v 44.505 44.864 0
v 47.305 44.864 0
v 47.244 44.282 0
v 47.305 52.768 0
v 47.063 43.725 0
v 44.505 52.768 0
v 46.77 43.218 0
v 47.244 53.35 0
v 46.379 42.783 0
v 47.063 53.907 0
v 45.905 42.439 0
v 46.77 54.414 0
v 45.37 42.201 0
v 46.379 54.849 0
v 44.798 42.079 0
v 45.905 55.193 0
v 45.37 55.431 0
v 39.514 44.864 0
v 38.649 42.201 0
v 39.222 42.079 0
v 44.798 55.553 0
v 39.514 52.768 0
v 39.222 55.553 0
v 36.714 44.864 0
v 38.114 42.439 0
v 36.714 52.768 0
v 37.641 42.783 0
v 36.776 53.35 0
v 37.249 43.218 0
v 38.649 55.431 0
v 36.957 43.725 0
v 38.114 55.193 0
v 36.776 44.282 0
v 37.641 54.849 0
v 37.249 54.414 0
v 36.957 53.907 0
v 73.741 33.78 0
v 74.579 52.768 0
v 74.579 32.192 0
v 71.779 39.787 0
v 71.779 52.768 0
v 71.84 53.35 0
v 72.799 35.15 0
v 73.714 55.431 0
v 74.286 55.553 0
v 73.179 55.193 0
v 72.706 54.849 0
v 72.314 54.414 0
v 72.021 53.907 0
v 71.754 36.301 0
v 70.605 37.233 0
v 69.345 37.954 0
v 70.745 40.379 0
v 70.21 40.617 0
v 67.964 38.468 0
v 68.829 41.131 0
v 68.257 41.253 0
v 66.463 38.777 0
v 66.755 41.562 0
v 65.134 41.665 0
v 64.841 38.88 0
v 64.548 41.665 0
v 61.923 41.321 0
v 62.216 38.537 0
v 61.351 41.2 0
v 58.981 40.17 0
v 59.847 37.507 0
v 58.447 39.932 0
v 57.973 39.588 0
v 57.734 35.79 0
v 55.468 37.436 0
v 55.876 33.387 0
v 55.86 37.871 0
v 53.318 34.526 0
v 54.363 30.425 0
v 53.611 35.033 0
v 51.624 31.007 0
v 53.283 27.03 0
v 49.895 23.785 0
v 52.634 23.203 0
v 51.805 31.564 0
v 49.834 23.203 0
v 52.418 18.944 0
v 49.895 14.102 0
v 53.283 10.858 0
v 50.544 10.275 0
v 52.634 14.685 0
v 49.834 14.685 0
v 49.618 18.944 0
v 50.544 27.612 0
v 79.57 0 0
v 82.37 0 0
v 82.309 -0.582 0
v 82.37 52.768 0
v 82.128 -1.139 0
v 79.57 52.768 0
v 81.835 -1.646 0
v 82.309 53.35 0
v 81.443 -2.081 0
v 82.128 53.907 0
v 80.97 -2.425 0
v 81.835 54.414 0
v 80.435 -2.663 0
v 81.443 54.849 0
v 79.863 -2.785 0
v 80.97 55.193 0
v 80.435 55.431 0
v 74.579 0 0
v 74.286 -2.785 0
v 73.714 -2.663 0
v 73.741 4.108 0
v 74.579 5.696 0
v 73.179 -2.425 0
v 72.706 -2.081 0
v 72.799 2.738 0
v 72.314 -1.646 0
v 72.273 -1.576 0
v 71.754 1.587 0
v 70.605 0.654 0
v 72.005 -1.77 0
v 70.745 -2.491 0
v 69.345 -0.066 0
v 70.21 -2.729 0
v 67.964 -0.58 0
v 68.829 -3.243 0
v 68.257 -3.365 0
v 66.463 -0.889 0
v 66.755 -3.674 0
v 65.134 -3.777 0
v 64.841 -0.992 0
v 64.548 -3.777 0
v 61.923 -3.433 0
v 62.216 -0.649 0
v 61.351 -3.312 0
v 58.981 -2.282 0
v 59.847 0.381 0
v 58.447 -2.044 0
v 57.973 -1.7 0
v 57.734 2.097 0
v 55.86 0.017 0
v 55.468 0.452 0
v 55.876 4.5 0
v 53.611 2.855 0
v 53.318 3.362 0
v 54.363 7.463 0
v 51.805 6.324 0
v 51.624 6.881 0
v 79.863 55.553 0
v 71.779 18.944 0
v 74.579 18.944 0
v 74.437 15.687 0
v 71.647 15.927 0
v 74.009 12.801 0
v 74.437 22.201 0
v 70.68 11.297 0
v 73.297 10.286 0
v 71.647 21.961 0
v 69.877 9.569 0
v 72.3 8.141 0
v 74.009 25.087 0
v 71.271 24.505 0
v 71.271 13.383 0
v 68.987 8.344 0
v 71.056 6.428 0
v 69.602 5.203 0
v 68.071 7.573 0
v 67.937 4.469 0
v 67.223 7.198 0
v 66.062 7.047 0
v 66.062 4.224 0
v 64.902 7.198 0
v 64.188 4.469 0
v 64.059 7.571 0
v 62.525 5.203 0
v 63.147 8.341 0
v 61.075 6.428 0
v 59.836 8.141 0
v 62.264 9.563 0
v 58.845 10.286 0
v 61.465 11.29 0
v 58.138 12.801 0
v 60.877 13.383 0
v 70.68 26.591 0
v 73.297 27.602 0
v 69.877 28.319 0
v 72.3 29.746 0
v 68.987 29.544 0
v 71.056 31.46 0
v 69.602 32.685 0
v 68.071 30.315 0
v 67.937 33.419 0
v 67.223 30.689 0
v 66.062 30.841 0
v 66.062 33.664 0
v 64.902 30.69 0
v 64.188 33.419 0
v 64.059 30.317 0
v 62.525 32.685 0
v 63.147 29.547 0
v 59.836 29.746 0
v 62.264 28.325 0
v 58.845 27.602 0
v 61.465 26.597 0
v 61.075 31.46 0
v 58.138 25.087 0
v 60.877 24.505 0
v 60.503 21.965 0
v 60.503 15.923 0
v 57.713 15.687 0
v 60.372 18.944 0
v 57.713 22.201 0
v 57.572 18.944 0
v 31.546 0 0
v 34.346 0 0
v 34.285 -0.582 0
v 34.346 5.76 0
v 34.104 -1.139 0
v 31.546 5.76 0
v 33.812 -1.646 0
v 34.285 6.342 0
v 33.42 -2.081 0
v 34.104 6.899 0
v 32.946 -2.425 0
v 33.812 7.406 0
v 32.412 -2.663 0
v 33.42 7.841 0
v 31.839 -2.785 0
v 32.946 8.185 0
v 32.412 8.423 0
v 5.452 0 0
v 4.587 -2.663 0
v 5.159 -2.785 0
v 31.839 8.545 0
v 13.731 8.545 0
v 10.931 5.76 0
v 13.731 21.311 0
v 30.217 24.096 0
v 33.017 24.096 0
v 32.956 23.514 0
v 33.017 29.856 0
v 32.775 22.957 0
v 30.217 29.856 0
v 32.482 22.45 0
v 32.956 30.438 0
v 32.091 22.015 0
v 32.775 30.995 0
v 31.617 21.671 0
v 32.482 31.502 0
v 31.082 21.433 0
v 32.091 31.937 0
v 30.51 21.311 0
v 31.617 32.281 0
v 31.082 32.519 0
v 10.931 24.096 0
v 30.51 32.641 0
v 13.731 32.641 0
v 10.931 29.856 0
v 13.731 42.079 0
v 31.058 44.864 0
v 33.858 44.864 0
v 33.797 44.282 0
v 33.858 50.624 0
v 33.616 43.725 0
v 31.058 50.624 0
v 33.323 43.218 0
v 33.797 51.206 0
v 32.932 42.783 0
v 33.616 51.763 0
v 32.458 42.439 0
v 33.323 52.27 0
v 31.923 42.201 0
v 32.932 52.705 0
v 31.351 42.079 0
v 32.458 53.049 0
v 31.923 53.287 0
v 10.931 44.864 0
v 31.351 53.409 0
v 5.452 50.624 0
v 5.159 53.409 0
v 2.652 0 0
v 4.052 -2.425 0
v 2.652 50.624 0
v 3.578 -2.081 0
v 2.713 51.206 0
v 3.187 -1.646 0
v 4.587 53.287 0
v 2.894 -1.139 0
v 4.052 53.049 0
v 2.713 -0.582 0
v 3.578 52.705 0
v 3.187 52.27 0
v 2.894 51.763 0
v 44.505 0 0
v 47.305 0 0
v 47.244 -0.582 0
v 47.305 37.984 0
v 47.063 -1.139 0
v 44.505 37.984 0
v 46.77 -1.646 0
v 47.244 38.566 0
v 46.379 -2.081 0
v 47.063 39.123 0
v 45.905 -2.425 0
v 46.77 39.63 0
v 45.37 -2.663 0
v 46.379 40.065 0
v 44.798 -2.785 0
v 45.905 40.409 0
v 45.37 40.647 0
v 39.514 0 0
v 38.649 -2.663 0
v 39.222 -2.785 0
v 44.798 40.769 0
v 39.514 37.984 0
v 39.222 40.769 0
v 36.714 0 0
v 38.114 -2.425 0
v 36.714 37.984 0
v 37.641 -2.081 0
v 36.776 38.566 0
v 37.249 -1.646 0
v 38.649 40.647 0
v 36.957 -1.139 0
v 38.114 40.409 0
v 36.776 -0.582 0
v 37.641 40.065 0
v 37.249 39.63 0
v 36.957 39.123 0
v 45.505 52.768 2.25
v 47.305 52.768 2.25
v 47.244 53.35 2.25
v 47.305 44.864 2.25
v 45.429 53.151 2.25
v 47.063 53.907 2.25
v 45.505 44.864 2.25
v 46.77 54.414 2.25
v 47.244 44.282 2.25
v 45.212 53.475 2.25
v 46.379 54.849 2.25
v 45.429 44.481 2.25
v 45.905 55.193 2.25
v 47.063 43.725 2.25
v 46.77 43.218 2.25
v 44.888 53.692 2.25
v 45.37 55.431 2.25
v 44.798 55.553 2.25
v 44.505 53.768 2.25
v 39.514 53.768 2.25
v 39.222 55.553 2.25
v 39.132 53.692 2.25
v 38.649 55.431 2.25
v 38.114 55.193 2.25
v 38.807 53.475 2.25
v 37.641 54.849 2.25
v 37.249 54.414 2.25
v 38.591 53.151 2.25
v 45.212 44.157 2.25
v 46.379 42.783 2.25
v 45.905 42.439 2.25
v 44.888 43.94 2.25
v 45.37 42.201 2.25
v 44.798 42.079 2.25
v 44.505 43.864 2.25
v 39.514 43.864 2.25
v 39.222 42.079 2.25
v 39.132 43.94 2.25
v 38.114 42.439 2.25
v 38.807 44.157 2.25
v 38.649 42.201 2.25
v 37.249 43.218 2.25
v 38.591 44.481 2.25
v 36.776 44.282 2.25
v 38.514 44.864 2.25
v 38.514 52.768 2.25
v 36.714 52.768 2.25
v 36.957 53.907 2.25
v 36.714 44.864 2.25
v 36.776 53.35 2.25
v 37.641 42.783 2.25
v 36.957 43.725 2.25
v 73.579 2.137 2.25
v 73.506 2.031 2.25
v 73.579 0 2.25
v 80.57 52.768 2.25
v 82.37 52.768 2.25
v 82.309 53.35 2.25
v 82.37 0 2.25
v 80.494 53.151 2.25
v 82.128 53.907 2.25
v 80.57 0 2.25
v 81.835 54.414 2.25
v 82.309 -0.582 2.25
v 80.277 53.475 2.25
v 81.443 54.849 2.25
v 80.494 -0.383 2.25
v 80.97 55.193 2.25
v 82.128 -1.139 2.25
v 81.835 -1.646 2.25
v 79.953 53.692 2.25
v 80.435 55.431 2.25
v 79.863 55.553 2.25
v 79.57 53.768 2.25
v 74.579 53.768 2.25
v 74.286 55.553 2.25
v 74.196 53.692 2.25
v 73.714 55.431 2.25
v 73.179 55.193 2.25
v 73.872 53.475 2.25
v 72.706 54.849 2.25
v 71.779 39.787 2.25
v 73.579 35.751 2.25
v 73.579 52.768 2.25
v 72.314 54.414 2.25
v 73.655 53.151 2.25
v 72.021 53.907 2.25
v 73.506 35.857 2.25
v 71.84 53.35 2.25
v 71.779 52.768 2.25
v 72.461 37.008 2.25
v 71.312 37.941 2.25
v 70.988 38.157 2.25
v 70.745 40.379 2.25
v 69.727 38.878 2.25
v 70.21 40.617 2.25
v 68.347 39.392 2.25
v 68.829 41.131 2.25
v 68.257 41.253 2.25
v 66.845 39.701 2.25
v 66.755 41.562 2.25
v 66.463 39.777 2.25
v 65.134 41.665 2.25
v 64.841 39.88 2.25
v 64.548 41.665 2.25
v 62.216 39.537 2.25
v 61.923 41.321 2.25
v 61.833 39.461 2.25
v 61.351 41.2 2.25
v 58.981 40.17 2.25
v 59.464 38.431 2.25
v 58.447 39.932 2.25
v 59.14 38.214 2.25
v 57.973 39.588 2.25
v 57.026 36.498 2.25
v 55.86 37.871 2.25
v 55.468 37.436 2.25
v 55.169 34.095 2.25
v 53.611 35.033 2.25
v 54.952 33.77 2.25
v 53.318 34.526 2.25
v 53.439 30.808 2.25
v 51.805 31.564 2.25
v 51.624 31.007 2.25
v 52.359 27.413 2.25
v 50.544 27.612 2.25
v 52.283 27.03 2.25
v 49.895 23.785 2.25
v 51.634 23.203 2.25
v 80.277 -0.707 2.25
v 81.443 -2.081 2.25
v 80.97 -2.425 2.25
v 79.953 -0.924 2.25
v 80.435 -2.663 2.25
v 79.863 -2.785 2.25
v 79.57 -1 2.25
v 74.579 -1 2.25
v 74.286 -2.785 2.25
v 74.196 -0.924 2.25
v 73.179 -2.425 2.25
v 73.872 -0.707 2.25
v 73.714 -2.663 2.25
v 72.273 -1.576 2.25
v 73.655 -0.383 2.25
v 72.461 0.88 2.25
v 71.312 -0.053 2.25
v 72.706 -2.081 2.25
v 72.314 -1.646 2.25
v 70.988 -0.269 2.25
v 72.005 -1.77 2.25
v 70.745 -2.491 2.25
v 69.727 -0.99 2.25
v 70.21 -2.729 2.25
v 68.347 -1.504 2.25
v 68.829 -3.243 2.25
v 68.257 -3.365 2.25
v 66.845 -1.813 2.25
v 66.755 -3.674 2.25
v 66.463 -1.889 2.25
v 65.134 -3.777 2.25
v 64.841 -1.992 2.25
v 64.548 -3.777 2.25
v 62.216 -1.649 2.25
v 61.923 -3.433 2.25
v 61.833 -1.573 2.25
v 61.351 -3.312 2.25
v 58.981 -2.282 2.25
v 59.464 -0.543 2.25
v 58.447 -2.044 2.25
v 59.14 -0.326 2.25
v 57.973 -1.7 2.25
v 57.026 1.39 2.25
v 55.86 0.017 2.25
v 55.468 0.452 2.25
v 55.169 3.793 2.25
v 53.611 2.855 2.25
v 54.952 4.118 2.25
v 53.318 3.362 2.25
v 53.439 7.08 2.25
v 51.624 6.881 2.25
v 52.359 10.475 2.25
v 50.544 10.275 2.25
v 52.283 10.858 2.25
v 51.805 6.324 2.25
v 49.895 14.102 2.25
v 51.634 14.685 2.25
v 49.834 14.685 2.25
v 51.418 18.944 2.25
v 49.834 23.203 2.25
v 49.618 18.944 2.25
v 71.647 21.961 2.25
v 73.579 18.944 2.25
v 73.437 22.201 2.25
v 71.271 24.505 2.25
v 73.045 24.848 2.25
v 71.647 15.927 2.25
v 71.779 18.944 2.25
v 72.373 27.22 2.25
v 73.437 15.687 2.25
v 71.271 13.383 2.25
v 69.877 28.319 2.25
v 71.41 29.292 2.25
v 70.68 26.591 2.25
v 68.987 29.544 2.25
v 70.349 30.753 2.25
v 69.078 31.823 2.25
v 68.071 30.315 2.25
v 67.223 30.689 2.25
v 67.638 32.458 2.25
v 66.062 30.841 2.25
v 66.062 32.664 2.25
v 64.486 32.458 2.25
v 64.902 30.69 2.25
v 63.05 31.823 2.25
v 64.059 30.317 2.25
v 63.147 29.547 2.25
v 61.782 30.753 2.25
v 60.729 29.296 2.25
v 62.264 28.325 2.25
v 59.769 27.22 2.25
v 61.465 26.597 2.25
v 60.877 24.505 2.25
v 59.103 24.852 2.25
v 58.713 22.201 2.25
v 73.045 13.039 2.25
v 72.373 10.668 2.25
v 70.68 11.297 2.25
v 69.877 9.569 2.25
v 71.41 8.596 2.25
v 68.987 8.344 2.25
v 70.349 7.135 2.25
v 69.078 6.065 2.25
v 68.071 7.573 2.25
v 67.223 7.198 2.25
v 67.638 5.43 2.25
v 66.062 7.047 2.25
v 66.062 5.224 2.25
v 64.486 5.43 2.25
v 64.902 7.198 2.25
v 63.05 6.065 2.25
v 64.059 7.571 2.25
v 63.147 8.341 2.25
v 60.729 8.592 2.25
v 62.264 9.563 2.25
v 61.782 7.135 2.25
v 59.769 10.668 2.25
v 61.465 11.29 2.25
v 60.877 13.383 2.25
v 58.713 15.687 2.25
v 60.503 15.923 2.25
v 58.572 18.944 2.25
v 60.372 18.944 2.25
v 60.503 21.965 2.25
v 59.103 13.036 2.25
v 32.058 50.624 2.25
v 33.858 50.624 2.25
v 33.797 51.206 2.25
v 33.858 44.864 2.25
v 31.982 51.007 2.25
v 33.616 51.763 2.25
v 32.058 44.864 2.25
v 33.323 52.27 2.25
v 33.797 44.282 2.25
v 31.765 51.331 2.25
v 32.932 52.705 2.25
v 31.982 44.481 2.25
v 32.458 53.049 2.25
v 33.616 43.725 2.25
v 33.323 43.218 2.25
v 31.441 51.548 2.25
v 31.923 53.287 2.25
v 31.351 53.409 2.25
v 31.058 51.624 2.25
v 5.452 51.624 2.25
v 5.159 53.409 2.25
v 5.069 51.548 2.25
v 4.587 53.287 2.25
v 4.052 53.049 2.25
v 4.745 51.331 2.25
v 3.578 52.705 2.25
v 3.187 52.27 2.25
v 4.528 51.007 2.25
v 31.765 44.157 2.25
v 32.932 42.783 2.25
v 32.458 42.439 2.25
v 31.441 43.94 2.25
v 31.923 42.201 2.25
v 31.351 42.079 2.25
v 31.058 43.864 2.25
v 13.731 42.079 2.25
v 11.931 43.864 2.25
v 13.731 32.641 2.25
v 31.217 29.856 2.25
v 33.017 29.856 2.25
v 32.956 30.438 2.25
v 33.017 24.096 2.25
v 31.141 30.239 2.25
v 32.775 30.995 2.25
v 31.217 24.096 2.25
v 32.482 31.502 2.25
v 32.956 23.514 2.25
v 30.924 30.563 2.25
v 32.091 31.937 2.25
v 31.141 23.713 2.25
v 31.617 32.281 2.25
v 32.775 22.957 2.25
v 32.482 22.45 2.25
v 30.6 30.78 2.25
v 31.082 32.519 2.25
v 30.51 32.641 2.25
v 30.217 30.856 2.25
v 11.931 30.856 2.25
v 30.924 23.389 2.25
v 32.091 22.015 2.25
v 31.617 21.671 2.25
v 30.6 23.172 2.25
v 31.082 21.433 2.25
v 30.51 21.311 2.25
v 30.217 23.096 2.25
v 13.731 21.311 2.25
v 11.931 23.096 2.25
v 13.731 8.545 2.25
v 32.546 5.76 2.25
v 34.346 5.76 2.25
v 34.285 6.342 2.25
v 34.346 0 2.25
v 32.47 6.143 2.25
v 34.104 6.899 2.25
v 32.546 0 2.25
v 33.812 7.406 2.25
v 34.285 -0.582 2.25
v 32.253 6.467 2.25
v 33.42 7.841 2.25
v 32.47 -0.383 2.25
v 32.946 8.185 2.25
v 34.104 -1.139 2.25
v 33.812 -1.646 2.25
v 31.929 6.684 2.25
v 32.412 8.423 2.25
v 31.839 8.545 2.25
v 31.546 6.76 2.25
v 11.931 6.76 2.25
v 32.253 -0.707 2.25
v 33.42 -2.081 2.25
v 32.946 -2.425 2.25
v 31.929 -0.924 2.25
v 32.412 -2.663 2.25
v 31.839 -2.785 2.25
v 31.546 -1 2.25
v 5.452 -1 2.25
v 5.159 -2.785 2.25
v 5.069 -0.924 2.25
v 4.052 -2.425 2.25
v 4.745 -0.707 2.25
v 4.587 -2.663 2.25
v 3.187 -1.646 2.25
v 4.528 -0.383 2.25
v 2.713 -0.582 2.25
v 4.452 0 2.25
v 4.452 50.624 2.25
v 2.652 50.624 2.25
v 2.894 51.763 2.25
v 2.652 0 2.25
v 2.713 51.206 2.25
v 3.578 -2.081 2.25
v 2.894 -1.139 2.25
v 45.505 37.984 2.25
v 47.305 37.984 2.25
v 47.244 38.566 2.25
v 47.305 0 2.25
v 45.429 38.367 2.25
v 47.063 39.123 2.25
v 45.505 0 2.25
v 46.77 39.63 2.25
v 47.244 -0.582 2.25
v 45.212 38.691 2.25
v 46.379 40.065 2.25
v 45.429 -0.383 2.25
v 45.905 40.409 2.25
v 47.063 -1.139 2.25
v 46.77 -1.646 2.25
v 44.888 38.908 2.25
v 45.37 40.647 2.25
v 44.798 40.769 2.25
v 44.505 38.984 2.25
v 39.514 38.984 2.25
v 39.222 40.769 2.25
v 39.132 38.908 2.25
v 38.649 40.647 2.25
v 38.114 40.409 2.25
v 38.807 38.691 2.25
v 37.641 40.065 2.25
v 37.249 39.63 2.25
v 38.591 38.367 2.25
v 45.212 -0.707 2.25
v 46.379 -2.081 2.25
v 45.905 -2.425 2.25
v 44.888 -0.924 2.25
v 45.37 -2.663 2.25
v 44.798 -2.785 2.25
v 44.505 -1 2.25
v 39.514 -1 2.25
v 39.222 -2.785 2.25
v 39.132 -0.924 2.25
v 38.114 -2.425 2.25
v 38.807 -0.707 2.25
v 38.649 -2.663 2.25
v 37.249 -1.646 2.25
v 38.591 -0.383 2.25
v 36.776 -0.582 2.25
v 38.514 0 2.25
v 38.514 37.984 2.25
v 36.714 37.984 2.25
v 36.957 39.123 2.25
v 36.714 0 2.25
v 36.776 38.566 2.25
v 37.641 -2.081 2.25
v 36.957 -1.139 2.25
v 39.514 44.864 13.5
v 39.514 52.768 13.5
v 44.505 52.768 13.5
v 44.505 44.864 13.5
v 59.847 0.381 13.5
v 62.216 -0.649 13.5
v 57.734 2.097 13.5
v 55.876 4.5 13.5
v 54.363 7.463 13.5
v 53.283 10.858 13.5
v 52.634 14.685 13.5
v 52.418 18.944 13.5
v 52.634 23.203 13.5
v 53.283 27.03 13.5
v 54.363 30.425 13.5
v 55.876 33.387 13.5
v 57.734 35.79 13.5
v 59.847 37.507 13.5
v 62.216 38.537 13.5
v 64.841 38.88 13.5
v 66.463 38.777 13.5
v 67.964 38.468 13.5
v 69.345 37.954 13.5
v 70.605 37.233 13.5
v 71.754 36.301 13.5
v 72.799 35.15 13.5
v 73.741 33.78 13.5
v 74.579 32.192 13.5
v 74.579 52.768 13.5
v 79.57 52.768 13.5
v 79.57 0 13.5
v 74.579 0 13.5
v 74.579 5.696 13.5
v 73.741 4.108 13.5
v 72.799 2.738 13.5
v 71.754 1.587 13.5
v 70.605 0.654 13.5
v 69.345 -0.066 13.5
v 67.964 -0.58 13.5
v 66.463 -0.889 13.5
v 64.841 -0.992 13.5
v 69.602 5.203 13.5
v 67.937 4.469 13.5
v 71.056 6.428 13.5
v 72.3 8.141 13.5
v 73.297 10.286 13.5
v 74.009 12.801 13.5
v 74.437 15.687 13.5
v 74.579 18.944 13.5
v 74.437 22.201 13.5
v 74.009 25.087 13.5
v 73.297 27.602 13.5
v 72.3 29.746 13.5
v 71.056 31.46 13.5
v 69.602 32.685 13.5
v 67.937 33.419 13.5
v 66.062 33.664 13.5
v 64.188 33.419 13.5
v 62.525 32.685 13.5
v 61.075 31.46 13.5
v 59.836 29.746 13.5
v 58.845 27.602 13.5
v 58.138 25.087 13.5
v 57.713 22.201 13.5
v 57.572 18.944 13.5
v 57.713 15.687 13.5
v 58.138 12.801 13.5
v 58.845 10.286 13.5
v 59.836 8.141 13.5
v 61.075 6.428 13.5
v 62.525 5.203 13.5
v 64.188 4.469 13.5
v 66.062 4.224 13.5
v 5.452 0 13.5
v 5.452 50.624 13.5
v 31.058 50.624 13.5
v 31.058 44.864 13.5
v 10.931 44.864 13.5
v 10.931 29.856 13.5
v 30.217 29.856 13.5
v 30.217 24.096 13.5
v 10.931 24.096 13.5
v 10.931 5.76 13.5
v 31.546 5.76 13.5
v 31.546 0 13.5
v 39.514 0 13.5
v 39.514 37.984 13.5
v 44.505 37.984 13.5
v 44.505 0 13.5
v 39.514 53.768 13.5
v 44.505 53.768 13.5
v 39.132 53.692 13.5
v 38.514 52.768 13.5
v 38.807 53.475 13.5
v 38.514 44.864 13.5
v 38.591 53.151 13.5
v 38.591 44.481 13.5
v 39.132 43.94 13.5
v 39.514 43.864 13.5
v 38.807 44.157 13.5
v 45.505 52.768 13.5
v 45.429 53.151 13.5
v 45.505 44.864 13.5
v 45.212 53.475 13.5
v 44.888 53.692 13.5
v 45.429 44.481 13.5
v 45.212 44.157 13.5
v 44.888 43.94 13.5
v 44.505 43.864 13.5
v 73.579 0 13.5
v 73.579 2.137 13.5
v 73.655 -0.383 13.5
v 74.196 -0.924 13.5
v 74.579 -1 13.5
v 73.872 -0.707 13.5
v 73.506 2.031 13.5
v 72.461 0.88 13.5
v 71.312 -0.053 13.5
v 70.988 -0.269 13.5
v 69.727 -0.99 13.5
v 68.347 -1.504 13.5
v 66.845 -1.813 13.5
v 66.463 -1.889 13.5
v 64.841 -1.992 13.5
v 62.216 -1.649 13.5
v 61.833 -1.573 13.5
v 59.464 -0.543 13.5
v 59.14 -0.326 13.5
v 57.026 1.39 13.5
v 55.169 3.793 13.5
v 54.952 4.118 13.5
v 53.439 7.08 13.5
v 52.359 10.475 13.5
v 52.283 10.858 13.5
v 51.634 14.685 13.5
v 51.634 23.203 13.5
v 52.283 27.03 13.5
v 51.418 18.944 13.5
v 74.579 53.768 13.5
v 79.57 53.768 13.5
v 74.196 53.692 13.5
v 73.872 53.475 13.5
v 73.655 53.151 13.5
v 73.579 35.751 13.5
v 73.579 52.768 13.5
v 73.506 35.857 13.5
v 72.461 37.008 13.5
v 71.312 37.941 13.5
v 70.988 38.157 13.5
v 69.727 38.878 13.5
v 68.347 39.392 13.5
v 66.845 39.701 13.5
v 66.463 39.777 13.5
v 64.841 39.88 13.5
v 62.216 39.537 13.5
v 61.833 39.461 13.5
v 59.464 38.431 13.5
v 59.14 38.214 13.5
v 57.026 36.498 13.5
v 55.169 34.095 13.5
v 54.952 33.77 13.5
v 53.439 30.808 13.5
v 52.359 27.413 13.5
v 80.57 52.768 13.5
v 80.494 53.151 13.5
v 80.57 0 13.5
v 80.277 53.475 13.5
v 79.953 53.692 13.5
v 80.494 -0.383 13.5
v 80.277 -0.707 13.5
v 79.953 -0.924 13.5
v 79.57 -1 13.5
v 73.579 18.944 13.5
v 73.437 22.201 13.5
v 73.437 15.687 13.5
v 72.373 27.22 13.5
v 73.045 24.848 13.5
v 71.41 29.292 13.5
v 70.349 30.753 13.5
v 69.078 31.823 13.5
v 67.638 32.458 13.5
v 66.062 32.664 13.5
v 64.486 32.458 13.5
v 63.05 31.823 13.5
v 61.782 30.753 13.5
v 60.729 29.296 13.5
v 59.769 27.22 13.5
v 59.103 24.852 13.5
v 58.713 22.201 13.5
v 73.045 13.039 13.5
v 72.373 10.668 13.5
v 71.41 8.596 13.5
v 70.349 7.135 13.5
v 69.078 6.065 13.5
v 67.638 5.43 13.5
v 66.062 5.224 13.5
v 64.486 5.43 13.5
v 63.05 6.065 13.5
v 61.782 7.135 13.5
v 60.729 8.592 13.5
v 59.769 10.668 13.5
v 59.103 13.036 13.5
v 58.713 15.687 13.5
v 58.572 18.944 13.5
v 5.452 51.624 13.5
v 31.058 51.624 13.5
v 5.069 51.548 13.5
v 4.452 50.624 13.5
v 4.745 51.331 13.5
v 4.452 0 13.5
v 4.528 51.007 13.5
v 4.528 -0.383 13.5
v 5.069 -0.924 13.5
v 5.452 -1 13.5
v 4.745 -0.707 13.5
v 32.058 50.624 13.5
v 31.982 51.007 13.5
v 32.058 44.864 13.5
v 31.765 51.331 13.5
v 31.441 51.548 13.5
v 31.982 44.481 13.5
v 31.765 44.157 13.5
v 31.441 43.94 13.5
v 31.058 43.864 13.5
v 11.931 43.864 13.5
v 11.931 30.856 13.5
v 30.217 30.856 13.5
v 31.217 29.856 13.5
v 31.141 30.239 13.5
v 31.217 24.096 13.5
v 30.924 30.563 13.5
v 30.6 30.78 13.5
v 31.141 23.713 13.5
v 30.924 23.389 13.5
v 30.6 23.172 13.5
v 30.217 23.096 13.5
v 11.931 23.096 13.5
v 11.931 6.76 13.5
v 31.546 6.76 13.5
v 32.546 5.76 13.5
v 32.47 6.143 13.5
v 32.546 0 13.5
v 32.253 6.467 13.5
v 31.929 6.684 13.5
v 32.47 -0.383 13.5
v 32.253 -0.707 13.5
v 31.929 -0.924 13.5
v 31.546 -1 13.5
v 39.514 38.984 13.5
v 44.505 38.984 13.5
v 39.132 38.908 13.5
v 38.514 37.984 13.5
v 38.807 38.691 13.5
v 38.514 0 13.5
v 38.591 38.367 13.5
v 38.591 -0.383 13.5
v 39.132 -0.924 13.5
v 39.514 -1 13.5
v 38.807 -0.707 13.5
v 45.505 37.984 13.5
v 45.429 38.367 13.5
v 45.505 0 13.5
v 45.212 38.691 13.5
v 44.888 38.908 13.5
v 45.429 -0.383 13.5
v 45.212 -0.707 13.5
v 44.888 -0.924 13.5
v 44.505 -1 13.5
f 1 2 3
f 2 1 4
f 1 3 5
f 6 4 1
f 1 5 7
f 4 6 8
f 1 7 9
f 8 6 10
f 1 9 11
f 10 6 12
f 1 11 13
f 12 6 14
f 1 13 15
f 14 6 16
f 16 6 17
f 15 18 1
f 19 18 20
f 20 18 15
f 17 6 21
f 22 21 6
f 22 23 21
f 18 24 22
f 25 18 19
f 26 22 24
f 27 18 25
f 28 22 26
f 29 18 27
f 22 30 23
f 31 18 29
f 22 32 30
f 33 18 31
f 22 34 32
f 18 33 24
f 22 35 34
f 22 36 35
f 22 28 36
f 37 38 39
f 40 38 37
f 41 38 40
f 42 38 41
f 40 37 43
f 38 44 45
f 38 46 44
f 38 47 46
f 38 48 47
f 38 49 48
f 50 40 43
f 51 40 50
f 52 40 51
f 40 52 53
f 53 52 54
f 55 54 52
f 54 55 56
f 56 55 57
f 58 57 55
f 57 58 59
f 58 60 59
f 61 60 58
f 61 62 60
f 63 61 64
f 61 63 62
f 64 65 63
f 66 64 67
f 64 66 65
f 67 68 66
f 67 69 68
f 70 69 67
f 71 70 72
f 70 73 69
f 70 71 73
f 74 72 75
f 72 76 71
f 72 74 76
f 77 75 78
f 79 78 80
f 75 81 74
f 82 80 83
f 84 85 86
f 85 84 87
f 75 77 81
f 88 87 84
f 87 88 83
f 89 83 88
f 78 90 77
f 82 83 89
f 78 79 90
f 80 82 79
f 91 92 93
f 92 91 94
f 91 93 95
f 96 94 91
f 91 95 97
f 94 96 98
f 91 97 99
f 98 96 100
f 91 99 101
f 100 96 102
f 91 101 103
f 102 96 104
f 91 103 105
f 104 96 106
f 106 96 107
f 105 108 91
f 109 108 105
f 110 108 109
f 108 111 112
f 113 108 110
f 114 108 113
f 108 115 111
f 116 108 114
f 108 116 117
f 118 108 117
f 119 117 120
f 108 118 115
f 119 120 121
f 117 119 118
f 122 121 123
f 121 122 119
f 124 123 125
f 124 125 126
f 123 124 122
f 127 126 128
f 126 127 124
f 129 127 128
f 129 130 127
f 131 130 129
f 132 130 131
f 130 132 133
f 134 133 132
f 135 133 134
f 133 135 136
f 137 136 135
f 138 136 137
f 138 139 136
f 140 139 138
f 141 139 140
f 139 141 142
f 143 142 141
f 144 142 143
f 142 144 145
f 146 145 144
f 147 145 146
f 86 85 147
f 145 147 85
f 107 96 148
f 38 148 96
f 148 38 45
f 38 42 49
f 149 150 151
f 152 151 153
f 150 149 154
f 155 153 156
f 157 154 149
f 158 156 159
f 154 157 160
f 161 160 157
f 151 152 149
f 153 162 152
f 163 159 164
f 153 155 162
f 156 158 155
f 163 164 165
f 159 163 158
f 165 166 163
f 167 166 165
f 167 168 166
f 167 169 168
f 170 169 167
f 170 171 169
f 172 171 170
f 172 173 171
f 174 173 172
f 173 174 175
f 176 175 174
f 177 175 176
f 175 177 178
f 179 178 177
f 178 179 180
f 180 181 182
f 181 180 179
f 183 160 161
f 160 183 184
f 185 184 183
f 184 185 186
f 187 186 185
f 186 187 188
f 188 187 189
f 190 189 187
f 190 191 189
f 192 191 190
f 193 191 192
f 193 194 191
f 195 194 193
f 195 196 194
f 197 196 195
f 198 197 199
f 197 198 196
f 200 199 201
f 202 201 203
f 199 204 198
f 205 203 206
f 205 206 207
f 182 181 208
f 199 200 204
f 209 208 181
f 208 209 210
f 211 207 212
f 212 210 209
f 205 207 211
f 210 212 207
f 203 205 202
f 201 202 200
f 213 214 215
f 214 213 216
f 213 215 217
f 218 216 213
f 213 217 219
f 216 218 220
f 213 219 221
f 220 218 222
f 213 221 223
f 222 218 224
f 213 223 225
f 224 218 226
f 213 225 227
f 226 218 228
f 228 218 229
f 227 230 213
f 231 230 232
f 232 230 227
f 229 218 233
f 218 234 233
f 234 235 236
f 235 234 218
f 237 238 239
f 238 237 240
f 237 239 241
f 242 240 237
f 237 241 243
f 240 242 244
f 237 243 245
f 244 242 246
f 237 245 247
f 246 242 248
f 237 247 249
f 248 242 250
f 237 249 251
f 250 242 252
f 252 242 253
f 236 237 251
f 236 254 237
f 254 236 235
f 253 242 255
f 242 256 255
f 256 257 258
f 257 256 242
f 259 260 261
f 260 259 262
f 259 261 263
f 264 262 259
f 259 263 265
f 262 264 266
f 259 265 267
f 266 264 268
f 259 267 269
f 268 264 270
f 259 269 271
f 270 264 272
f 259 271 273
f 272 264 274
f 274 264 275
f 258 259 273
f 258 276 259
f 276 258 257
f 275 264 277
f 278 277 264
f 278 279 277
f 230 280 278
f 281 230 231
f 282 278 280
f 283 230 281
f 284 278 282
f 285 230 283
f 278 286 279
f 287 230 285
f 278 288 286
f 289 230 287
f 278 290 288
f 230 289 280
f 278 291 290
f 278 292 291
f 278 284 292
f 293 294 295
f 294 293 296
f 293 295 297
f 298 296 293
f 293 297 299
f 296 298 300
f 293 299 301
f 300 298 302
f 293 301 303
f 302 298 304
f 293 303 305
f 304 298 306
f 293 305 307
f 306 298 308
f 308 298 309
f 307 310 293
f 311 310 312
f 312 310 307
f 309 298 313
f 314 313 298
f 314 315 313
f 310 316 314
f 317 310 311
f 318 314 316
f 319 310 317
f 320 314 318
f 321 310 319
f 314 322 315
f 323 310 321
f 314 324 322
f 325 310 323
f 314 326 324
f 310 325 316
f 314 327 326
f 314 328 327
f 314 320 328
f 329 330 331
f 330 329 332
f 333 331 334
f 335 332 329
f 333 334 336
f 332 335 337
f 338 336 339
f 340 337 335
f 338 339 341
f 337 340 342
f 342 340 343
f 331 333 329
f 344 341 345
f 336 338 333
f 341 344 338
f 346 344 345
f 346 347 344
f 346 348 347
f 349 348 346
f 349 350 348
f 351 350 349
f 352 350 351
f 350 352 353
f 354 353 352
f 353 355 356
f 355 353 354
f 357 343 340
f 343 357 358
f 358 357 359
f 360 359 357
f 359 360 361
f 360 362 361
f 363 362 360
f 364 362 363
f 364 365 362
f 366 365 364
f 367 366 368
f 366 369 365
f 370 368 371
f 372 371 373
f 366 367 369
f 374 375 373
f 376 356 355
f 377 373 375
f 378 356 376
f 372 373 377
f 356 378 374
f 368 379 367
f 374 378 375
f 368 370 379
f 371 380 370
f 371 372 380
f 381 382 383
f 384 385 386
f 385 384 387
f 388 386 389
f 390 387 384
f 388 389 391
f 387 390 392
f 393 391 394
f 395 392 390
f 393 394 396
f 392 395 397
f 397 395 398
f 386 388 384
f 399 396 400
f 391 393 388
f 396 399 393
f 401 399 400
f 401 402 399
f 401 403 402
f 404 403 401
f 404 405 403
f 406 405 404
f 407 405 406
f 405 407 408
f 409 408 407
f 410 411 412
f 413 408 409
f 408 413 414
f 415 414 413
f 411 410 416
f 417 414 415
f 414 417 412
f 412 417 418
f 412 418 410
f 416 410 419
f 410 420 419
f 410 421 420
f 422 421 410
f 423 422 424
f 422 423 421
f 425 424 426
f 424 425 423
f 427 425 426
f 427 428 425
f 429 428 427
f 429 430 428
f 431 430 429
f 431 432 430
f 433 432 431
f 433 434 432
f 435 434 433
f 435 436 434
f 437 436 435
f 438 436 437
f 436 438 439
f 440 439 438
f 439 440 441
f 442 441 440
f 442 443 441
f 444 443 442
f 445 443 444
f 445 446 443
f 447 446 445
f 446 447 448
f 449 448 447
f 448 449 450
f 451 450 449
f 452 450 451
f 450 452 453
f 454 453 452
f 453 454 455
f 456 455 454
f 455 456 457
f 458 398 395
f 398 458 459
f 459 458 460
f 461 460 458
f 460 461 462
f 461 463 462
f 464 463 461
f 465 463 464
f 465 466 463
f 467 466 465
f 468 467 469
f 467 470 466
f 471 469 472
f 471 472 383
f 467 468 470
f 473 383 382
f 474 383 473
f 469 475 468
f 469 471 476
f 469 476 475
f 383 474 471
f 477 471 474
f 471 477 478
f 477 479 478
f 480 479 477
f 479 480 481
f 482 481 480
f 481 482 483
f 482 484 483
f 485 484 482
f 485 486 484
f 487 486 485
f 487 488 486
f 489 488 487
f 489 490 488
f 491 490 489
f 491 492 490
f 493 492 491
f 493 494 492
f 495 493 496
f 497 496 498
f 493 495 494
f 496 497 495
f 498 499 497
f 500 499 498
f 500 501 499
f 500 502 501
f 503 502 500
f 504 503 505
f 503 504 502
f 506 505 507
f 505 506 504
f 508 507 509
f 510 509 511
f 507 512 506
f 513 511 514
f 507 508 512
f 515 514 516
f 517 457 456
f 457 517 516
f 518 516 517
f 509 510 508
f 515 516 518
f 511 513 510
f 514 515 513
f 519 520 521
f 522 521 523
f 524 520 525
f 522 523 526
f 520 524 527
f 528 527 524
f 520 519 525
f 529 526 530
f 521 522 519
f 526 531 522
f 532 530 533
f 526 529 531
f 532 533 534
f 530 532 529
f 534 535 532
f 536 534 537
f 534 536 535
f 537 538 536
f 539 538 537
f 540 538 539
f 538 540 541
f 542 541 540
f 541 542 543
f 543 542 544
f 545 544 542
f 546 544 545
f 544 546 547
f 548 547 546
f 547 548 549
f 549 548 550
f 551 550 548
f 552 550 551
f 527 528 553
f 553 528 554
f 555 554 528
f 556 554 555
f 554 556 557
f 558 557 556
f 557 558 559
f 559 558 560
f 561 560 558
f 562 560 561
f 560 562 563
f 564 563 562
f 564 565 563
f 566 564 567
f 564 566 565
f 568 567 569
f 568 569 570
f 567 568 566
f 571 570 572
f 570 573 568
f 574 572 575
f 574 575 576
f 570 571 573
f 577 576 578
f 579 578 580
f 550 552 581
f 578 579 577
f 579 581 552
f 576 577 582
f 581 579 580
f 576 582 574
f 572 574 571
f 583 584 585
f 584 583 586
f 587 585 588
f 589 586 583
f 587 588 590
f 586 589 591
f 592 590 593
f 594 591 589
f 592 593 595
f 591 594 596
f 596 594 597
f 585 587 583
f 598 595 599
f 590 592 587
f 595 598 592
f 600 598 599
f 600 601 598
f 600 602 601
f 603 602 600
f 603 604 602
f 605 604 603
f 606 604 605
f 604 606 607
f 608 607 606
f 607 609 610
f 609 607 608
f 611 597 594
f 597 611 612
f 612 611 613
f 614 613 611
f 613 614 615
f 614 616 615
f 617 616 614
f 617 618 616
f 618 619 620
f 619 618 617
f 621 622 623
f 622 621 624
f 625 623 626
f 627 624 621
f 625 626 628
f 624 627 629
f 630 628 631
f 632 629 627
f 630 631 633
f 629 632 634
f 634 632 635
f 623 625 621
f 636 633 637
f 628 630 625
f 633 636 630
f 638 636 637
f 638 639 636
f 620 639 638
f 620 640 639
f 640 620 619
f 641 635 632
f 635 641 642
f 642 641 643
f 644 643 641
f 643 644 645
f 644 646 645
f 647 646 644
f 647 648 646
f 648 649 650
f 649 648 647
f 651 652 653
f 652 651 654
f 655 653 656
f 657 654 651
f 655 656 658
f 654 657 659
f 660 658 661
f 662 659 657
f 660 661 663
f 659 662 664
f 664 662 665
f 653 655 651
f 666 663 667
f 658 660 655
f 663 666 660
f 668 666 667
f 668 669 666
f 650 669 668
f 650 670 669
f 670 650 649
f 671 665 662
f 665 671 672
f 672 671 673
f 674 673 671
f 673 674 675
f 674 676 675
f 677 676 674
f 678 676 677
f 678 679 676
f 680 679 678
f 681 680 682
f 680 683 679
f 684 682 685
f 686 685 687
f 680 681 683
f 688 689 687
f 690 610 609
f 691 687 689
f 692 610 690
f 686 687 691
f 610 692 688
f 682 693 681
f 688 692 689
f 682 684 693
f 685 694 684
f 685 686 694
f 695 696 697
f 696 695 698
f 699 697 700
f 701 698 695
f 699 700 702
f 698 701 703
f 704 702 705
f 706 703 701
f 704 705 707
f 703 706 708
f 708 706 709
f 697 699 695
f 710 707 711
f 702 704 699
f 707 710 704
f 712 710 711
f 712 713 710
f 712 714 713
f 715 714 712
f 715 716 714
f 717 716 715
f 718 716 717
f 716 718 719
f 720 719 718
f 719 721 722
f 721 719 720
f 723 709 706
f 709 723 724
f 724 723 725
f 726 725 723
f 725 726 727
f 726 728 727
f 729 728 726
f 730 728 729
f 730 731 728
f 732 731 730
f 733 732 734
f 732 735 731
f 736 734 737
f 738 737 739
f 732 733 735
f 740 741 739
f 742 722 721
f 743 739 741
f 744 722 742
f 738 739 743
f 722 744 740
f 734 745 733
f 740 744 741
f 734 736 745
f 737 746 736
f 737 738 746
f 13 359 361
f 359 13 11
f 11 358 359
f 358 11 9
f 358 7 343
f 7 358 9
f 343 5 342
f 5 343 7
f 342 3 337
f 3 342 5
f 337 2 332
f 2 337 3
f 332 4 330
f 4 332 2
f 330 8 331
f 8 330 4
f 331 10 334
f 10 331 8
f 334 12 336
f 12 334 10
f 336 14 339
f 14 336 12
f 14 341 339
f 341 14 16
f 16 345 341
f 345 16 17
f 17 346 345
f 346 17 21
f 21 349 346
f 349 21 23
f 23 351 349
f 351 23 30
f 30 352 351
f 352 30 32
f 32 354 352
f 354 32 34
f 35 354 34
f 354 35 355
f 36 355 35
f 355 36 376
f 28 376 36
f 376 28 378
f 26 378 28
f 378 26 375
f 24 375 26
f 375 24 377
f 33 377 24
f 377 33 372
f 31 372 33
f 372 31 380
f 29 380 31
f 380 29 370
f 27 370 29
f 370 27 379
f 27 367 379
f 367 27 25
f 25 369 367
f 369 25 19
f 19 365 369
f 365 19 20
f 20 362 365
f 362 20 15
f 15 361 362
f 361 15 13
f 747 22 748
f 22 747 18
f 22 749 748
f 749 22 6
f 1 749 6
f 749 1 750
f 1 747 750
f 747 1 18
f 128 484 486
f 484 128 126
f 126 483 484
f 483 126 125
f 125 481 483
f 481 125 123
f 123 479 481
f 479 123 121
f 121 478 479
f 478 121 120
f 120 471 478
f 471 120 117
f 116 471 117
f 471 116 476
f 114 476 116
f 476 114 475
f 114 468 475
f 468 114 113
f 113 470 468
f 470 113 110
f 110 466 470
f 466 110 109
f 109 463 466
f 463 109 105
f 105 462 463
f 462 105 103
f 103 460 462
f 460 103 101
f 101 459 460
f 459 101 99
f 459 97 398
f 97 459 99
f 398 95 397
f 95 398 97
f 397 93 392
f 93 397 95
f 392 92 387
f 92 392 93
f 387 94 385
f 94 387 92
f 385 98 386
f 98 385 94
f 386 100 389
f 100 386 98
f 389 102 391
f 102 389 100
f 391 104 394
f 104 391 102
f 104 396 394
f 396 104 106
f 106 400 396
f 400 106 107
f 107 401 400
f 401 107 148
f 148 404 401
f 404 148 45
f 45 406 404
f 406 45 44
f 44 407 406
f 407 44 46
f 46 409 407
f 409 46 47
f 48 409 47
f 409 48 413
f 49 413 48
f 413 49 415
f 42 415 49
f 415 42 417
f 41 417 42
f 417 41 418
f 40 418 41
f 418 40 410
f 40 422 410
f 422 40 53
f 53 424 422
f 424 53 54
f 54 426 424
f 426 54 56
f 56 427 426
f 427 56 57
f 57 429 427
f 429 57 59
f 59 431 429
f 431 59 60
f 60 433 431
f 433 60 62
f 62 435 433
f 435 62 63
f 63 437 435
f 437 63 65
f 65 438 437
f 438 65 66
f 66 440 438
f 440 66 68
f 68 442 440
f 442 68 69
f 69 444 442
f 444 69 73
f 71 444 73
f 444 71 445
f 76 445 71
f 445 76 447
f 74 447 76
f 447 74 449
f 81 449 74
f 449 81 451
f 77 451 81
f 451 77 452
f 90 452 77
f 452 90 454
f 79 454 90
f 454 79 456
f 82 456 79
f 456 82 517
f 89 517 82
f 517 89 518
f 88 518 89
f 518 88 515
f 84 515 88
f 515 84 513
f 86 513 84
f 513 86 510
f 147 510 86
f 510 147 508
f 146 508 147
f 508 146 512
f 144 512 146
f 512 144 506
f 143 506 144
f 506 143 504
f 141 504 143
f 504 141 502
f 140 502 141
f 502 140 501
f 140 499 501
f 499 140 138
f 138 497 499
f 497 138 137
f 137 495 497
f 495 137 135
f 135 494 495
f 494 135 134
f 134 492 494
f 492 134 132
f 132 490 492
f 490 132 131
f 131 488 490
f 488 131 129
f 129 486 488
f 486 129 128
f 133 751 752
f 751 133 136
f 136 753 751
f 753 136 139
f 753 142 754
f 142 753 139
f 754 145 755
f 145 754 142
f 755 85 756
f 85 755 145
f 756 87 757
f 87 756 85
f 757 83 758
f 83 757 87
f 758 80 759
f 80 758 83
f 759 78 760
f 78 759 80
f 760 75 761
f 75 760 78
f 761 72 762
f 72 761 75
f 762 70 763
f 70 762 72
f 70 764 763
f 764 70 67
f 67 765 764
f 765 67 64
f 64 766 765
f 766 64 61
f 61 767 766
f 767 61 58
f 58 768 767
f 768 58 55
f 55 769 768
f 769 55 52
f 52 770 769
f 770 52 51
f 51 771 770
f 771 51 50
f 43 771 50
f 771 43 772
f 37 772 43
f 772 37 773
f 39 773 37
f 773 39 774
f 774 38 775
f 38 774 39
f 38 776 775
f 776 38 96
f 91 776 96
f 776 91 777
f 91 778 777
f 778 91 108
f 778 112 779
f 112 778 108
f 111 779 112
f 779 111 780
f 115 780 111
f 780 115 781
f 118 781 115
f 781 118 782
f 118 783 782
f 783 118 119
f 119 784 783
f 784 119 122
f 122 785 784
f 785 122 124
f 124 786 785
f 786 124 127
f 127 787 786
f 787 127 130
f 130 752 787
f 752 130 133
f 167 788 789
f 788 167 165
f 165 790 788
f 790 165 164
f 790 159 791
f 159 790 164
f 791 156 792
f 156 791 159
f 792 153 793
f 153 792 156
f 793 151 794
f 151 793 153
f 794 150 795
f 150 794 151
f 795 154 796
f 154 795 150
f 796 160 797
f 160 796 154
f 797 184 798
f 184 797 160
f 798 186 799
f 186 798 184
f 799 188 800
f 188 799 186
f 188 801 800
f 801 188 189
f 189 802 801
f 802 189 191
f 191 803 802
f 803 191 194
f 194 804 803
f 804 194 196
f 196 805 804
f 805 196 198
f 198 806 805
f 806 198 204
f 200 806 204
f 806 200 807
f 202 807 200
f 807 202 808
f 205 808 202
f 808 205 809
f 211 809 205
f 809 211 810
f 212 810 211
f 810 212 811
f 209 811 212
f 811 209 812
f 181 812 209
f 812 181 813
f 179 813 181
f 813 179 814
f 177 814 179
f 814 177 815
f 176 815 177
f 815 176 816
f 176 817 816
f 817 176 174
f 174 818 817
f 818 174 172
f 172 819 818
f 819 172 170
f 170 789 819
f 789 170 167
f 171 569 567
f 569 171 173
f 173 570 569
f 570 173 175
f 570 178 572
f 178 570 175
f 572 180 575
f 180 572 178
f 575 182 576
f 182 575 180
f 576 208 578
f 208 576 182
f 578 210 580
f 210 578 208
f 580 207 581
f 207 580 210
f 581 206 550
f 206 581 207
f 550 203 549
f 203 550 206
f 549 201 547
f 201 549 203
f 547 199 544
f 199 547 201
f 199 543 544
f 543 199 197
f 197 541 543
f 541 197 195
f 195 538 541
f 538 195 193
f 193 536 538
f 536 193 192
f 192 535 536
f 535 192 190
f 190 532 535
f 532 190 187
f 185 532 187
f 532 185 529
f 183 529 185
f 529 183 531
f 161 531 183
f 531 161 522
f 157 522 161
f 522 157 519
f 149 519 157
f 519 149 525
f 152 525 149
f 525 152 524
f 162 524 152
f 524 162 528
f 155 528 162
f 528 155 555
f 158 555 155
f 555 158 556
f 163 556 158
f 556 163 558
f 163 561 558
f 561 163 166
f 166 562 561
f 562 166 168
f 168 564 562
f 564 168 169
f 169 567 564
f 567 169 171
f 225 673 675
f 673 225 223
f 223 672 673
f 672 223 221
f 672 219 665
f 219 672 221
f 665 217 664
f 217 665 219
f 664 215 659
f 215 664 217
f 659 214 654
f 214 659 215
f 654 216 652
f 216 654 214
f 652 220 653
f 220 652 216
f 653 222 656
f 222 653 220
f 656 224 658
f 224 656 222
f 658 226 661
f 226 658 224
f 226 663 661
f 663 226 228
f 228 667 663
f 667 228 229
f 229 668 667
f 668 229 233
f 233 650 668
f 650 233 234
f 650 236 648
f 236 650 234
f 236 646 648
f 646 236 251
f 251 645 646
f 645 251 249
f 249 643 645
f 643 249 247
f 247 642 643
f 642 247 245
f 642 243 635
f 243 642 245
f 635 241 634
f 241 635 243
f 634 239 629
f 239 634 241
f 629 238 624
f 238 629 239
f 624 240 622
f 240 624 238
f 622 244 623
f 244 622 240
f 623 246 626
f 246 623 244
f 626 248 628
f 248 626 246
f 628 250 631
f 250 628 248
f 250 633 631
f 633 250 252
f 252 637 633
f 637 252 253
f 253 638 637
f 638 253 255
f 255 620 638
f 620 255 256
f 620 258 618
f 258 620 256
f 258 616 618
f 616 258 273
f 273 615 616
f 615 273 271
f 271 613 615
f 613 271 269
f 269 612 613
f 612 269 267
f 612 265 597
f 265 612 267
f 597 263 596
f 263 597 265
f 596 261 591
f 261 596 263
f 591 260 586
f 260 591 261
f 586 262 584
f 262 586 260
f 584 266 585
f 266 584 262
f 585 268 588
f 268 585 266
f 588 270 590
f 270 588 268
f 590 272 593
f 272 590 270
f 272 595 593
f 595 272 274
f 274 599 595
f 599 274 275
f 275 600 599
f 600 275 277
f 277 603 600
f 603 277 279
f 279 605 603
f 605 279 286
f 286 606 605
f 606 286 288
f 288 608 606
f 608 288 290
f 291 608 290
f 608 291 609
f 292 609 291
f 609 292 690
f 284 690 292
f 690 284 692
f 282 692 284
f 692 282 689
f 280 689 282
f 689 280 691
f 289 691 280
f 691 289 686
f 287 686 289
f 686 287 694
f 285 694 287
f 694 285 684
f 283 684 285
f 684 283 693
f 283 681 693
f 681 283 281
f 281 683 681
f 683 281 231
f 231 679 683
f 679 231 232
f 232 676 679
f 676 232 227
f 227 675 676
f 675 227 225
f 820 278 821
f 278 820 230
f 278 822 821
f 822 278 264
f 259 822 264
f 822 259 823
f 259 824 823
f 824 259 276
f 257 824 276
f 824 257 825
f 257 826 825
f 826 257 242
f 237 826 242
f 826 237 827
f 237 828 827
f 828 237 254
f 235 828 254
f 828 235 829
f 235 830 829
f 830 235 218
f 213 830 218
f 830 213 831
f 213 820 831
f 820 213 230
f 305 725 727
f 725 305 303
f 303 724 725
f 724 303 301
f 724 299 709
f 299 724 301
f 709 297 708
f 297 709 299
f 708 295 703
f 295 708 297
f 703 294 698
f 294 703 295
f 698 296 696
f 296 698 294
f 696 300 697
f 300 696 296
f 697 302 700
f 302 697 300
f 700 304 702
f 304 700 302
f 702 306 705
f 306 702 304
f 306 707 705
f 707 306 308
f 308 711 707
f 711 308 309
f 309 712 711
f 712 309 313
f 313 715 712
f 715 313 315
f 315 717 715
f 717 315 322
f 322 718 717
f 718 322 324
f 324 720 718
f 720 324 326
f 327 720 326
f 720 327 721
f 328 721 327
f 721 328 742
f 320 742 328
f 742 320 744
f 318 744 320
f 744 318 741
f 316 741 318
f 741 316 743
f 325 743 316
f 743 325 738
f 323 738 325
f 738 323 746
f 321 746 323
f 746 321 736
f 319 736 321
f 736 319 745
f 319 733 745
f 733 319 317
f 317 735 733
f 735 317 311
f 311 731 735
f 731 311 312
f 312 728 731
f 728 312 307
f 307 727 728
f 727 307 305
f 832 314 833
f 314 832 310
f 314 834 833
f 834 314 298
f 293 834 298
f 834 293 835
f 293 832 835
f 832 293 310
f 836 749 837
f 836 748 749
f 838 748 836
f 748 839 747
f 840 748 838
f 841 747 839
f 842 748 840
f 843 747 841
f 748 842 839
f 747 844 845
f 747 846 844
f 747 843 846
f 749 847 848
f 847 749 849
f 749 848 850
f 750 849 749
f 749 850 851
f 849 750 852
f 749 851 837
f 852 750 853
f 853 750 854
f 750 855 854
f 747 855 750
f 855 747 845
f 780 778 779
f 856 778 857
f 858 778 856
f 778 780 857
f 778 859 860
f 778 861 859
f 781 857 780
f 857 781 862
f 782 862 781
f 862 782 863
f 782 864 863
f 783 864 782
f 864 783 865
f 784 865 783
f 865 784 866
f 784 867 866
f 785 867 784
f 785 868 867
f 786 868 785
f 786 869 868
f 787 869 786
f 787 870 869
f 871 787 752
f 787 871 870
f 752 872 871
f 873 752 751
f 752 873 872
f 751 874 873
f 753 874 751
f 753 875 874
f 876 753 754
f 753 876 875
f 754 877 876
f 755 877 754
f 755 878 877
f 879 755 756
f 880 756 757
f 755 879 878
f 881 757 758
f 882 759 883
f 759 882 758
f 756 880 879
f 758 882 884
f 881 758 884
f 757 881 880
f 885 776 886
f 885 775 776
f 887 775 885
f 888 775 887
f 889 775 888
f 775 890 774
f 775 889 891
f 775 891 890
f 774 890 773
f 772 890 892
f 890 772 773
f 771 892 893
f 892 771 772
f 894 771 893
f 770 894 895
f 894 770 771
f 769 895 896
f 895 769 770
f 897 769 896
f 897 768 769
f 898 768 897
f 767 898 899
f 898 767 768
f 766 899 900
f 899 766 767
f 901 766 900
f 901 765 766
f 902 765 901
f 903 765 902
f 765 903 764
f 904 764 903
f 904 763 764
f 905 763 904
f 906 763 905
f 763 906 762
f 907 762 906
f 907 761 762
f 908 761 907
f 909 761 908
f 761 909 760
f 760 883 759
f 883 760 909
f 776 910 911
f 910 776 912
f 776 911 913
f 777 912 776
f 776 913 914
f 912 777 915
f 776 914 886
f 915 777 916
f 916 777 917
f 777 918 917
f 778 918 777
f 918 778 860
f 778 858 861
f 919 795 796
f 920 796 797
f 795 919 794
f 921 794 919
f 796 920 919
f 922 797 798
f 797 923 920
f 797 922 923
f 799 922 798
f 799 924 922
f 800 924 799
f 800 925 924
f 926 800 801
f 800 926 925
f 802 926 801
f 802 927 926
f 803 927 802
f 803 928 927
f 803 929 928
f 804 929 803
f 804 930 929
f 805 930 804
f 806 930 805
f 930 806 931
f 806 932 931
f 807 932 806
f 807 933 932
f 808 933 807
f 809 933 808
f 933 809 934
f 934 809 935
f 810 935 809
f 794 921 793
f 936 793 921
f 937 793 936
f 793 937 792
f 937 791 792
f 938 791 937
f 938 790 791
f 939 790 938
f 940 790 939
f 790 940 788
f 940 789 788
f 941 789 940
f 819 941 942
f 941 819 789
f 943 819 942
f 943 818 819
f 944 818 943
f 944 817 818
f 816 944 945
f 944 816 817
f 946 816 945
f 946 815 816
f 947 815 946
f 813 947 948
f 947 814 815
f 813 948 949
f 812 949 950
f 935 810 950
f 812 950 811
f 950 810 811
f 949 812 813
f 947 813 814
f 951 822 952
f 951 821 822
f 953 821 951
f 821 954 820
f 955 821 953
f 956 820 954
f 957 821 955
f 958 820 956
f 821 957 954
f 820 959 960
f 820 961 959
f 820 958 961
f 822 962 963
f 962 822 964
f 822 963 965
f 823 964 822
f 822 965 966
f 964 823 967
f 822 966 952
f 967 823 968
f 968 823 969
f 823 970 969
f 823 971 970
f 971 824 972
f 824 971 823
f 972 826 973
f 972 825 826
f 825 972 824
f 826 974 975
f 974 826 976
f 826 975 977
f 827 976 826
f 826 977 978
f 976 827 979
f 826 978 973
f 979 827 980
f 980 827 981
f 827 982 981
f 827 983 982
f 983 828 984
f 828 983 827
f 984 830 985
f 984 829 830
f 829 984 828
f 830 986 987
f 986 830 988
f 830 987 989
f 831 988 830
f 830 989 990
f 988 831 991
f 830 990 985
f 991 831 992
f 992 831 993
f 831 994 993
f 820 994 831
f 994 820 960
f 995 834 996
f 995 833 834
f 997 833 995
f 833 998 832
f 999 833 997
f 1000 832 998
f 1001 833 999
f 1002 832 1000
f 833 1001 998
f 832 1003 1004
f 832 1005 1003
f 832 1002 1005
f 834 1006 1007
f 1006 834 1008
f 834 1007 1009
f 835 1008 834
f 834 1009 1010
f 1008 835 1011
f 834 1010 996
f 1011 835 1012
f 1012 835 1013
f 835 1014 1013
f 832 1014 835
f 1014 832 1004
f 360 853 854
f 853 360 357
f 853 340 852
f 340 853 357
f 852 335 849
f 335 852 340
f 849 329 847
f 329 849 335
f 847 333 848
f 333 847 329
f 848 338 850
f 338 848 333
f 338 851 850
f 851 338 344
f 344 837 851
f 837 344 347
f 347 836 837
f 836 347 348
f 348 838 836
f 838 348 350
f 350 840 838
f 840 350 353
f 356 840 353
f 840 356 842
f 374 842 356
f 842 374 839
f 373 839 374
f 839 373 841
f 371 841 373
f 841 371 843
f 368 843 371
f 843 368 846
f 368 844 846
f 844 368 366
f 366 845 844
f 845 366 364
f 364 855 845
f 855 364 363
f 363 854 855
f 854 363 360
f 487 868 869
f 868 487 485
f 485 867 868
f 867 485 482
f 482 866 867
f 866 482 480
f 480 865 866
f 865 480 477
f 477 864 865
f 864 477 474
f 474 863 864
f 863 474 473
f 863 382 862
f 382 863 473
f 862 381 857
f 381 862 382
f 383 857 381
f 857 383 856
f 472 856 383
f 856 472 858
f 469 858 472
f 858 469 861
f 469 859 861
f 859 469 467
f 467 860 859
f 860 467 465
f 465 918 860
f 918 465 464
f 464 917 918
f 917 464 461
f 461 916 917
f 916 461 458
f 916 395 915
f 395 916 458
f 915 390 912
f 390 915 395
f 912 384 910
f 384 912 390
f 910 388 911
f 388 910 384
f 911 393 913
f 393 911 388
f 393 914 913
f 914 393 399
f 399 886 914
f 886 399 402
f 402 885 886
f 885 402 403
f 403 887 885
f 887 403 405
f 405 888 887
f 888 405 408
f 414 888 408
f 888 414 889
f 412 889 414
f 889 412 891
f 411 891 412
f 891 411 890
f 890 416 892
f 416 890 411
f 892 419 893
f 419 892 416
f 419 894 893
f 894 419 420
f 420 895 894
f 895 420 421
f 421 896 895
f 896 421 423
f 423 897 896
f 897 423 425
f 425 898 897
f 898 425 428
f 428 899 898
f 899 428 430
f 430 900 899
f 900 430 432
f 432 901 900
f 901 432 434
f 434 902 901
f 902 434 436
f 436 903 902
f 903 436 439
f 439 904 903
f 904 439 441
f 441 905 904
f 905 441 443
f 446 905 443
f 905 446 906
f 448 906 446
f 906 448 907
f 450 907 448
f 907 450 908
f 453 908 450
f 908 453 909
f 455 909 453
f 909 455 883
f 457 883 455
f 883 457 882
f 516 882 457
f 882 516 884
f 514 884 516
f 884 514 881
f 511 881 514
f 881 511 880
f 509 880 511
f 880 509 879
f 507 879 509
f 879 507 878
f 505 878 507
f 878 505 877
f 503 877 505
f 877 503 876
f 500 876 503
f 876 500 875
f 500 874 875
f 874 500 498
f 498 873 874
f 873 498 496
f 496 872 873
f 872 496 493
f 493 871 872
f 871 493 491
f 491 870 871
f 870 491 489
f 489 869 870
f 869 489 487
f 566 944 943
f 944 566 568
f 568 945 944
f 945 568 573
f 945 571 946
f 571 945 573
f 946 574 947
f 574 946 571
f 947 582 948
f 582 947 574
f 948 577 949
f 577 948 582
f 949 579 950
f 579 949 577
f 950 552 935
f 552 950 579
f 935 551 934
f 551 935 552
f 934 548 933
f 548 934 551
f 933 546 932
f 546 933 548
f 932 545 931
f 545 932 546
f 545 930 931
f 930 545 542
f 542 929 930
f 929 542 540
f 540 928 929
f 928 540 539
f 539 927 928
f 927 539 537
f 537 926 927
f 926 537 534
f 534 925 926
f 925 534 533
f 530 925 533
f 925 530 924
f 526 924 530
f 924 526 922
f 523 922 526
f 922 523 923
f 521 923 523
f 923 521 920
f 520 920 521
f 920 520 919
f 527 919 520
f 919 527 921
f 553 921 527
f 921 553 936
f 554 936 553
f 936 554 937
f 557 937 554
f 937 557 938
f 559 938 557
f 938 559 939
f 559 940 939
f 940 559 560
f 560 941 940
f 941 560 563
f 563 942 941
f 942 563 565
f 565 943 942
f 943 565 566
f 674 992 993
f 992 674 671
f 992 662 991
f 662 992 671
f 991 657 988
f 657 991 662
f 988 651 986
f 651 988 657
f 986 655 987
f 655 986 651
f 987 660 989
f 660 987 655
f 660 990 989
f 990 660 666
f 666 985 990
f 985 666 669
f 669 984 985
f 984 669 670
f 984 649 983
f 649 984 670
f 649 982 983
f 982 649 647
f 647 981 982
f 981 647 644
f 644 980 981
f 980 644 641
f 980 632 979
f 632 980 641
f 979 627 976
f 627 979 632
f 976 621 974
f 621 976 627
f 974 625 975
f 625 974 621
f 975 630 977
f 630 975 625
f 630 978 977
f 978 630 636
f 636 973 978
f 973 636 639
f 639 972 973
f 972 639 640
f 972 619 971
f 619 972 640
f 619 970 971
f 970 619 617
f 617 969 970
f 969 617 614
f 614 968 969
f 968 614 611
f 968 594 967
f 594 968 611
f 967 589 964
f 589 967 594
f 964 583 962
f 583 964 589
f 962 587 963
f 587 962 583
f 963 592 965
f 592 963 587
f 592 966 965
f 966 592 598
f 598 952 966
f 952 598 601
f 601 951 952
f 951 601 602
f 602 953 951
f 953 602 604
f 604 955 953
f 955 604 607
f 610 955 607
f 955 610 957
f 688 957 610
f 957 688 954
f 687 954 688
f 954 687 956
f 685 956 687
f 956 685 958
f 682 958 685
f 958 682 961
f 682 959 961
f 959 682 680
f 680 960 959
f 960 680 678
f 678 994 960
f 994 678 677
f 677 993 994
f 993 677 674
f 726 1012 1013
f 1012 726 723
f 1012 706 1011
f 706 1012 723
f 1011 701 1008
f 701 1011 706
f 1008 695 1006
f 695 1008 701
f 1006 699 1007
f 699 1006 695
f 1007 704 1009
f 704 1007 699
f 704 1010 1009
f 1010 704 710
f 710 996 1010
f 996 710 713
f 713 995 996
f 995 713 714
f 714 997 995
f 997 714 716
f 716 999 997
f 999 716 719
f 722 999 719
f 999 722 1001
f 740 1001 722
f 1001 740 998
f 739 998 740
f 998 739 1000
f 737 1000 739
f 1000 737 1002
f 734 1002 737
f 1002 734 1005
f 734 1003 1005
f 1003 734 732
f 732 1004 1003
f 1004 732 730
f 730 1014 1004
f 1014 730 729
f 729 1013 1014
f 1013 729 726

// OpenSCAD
// file: Common.scad
module offset_shell(thickness = 0.1) {
  render() {
      difference() {
          minkowski() {
            children();
            circle(2* thickness, center=true);
          }
        children();
      }
   }
}

module cookie_cutter(handle_thickness=8, cutter_tickness=3, total_height=15) {
    union() {
        linear_extrude(height = total_height*(0.15), slices = 60) {
            scale([.2,.2,1]) {
              offset_shell(handle_thickness) {
                children();

              }
            }
        };
        linear_extrude(height = total_height*(0.9), slices = 60)
            translate([0,0,2])
            scale([.2,.2,1]) {
              offset_shell(cutter_tickness) {
                children();
            }
        };
    }
}

module rod_with_clipped_circle(square_d, circle_d, circle_placement) {
    difference() {
        square(square_d, center=true);
        translate(circle_placement) circle(circle_d, center=true);
    }
}

//module cookie_press(handle_thickness=2.5, cutter_tickness=1, total_height=10) {
//    union() {
//        cookie_cutter(handle_thickness, cutter_tickness, total_height);
//        translate([0,0,10]) children();
//    }
//}
//
//
// file: ../ComplexShapes.scad
include <BasicShapes.scad>

module HalfCylinder(r, h, e=1, center=false) {
    translate([0,0, center ? -h/2 : 0])difference(){
        cylinder(h,r,r);
        translate([0,-r,-e])cube([2*r,2*r,h+2*e]);
    }
}

module HalfCircle(r) {
    difference(){
        circle(r);
        translate([-r,-2*r,0]) square(2*r);
    }
}

// http://benjamin-engel.blogspot.com/2015/07/openscad-tips-and-tricks.html

module equilateral_triangle(h) {
    rotate([0,0,-30]) circle(r=h, $fn=3);
}

module Crescent(r, fatten_scale=1, curve_angle=0, rotate=0) {
    r_prime = r / fatten_scale;
    rotate([0,0,rotate]) difference() {
        circle(r_prime*1.1);
        translate([r_prime/4, curve_angle*r_prime/4, 0]) circle(r_prime*fatten_scale);
    }
}


module round_edges(r) {
    minkowski() {
        children();
        circle(r);
    };
}

module CrescentV2(outer_r, inner_r, r_shift, edge_rounding=2) {
    // Different way to construct ... rounded edges ...
   round_edges(edge_rounding) {
        difference() {
            circle(outer_r);
            translate(r_shift) circle(inner_r);
        };
    };
}


//module Arch(x,y,r) {
//    // http://kitwallace.co.uk/Blog/item/2013-01-28T17:59:00Z
//    union() {
//        intersection() {
//           translate([x,y,0]) circle(r);
//           translate([-x,y,0]) circle(r);
//        }
//        translate([0,y/2,0]) square(size=[2 * (r-x), y], center=true);
//    }
//}

module Arch(width, arc_height, strech_height=0) {
    // http://kitwallace.co.uk/Blog/item/2013-01-28T17:59:00Z
    r = arc_height;
    x = (width / 2) - r;
    y = arc_height + strech_height;
    union() {
        intersection() {
           translate([x,y,0]) circle(r);
           translate([-x,y,0]) circle(r);
        }
        translate([0,y/2,0]) square(size=[width, y], center=true);
    }
}
// file: ../BasicShapes.scad
module Star(points, outer, inner_defaulted=0) {
    inner = inner_defaulted == 0 ? 2 * outer  : inner_defaulted;
	// polar to cartesian: radius/angle to x/y
	function x(r, a) = r * cos(a);
	function y(r, a) = r * sin(a);
	
	// angular width of each pie slice of the star
	increment = 360/points;
	
	union() {
		for (p = [0 : points-1]) {
			
			// outer is outer point p
			// inner is inner point following p
			// next is next outer point following p

			assign(	
                x_outer = x(outer, increment * p),
                y_outer = y(outer, increment * p),
                x_inner = x(inner, (increment * p) + (increment/2)),
                y_inner = y(inner, (increment * p) + (increment/2)),
                x_next  = x(outer, increment * (p+1)),
                y_next  = y(outer, increment * (p+1))
            ) {
				polygon(
                    points = [
                        [x_outer, y_outer], 
                        [x_inner, y_inner],
                        [x_next, y_next], 
                        [0, 0]
                    ], 
                    paths  = [[0, 1, 2, 3]]
                );
			}
		}
	}
}

//https://github.com/openscad/MCAD/blob/master/shapes.scad
module Hexagon(size) {
  Star(3, size, size);
}

module Octagon(size) {
  Star(4, size, size);
}

module Decagon(size) {
  Star(5, size, size);
}

module Decagon(size) {
  Star(5, size, size);
}

module Dodecagon(size) {
  Star(6, size, size);
}
// main file
include <../BasicShapes.scad>
include <../ComplexShapes.scad>
include <Common.scad>

cookie_cutter(7,2.5,15) {
    scale([20,25,1]) text("Eid", font = "Tingler Script");
//    scale([20,25,1]) text("Adha", font = "Tingler Script");
}
